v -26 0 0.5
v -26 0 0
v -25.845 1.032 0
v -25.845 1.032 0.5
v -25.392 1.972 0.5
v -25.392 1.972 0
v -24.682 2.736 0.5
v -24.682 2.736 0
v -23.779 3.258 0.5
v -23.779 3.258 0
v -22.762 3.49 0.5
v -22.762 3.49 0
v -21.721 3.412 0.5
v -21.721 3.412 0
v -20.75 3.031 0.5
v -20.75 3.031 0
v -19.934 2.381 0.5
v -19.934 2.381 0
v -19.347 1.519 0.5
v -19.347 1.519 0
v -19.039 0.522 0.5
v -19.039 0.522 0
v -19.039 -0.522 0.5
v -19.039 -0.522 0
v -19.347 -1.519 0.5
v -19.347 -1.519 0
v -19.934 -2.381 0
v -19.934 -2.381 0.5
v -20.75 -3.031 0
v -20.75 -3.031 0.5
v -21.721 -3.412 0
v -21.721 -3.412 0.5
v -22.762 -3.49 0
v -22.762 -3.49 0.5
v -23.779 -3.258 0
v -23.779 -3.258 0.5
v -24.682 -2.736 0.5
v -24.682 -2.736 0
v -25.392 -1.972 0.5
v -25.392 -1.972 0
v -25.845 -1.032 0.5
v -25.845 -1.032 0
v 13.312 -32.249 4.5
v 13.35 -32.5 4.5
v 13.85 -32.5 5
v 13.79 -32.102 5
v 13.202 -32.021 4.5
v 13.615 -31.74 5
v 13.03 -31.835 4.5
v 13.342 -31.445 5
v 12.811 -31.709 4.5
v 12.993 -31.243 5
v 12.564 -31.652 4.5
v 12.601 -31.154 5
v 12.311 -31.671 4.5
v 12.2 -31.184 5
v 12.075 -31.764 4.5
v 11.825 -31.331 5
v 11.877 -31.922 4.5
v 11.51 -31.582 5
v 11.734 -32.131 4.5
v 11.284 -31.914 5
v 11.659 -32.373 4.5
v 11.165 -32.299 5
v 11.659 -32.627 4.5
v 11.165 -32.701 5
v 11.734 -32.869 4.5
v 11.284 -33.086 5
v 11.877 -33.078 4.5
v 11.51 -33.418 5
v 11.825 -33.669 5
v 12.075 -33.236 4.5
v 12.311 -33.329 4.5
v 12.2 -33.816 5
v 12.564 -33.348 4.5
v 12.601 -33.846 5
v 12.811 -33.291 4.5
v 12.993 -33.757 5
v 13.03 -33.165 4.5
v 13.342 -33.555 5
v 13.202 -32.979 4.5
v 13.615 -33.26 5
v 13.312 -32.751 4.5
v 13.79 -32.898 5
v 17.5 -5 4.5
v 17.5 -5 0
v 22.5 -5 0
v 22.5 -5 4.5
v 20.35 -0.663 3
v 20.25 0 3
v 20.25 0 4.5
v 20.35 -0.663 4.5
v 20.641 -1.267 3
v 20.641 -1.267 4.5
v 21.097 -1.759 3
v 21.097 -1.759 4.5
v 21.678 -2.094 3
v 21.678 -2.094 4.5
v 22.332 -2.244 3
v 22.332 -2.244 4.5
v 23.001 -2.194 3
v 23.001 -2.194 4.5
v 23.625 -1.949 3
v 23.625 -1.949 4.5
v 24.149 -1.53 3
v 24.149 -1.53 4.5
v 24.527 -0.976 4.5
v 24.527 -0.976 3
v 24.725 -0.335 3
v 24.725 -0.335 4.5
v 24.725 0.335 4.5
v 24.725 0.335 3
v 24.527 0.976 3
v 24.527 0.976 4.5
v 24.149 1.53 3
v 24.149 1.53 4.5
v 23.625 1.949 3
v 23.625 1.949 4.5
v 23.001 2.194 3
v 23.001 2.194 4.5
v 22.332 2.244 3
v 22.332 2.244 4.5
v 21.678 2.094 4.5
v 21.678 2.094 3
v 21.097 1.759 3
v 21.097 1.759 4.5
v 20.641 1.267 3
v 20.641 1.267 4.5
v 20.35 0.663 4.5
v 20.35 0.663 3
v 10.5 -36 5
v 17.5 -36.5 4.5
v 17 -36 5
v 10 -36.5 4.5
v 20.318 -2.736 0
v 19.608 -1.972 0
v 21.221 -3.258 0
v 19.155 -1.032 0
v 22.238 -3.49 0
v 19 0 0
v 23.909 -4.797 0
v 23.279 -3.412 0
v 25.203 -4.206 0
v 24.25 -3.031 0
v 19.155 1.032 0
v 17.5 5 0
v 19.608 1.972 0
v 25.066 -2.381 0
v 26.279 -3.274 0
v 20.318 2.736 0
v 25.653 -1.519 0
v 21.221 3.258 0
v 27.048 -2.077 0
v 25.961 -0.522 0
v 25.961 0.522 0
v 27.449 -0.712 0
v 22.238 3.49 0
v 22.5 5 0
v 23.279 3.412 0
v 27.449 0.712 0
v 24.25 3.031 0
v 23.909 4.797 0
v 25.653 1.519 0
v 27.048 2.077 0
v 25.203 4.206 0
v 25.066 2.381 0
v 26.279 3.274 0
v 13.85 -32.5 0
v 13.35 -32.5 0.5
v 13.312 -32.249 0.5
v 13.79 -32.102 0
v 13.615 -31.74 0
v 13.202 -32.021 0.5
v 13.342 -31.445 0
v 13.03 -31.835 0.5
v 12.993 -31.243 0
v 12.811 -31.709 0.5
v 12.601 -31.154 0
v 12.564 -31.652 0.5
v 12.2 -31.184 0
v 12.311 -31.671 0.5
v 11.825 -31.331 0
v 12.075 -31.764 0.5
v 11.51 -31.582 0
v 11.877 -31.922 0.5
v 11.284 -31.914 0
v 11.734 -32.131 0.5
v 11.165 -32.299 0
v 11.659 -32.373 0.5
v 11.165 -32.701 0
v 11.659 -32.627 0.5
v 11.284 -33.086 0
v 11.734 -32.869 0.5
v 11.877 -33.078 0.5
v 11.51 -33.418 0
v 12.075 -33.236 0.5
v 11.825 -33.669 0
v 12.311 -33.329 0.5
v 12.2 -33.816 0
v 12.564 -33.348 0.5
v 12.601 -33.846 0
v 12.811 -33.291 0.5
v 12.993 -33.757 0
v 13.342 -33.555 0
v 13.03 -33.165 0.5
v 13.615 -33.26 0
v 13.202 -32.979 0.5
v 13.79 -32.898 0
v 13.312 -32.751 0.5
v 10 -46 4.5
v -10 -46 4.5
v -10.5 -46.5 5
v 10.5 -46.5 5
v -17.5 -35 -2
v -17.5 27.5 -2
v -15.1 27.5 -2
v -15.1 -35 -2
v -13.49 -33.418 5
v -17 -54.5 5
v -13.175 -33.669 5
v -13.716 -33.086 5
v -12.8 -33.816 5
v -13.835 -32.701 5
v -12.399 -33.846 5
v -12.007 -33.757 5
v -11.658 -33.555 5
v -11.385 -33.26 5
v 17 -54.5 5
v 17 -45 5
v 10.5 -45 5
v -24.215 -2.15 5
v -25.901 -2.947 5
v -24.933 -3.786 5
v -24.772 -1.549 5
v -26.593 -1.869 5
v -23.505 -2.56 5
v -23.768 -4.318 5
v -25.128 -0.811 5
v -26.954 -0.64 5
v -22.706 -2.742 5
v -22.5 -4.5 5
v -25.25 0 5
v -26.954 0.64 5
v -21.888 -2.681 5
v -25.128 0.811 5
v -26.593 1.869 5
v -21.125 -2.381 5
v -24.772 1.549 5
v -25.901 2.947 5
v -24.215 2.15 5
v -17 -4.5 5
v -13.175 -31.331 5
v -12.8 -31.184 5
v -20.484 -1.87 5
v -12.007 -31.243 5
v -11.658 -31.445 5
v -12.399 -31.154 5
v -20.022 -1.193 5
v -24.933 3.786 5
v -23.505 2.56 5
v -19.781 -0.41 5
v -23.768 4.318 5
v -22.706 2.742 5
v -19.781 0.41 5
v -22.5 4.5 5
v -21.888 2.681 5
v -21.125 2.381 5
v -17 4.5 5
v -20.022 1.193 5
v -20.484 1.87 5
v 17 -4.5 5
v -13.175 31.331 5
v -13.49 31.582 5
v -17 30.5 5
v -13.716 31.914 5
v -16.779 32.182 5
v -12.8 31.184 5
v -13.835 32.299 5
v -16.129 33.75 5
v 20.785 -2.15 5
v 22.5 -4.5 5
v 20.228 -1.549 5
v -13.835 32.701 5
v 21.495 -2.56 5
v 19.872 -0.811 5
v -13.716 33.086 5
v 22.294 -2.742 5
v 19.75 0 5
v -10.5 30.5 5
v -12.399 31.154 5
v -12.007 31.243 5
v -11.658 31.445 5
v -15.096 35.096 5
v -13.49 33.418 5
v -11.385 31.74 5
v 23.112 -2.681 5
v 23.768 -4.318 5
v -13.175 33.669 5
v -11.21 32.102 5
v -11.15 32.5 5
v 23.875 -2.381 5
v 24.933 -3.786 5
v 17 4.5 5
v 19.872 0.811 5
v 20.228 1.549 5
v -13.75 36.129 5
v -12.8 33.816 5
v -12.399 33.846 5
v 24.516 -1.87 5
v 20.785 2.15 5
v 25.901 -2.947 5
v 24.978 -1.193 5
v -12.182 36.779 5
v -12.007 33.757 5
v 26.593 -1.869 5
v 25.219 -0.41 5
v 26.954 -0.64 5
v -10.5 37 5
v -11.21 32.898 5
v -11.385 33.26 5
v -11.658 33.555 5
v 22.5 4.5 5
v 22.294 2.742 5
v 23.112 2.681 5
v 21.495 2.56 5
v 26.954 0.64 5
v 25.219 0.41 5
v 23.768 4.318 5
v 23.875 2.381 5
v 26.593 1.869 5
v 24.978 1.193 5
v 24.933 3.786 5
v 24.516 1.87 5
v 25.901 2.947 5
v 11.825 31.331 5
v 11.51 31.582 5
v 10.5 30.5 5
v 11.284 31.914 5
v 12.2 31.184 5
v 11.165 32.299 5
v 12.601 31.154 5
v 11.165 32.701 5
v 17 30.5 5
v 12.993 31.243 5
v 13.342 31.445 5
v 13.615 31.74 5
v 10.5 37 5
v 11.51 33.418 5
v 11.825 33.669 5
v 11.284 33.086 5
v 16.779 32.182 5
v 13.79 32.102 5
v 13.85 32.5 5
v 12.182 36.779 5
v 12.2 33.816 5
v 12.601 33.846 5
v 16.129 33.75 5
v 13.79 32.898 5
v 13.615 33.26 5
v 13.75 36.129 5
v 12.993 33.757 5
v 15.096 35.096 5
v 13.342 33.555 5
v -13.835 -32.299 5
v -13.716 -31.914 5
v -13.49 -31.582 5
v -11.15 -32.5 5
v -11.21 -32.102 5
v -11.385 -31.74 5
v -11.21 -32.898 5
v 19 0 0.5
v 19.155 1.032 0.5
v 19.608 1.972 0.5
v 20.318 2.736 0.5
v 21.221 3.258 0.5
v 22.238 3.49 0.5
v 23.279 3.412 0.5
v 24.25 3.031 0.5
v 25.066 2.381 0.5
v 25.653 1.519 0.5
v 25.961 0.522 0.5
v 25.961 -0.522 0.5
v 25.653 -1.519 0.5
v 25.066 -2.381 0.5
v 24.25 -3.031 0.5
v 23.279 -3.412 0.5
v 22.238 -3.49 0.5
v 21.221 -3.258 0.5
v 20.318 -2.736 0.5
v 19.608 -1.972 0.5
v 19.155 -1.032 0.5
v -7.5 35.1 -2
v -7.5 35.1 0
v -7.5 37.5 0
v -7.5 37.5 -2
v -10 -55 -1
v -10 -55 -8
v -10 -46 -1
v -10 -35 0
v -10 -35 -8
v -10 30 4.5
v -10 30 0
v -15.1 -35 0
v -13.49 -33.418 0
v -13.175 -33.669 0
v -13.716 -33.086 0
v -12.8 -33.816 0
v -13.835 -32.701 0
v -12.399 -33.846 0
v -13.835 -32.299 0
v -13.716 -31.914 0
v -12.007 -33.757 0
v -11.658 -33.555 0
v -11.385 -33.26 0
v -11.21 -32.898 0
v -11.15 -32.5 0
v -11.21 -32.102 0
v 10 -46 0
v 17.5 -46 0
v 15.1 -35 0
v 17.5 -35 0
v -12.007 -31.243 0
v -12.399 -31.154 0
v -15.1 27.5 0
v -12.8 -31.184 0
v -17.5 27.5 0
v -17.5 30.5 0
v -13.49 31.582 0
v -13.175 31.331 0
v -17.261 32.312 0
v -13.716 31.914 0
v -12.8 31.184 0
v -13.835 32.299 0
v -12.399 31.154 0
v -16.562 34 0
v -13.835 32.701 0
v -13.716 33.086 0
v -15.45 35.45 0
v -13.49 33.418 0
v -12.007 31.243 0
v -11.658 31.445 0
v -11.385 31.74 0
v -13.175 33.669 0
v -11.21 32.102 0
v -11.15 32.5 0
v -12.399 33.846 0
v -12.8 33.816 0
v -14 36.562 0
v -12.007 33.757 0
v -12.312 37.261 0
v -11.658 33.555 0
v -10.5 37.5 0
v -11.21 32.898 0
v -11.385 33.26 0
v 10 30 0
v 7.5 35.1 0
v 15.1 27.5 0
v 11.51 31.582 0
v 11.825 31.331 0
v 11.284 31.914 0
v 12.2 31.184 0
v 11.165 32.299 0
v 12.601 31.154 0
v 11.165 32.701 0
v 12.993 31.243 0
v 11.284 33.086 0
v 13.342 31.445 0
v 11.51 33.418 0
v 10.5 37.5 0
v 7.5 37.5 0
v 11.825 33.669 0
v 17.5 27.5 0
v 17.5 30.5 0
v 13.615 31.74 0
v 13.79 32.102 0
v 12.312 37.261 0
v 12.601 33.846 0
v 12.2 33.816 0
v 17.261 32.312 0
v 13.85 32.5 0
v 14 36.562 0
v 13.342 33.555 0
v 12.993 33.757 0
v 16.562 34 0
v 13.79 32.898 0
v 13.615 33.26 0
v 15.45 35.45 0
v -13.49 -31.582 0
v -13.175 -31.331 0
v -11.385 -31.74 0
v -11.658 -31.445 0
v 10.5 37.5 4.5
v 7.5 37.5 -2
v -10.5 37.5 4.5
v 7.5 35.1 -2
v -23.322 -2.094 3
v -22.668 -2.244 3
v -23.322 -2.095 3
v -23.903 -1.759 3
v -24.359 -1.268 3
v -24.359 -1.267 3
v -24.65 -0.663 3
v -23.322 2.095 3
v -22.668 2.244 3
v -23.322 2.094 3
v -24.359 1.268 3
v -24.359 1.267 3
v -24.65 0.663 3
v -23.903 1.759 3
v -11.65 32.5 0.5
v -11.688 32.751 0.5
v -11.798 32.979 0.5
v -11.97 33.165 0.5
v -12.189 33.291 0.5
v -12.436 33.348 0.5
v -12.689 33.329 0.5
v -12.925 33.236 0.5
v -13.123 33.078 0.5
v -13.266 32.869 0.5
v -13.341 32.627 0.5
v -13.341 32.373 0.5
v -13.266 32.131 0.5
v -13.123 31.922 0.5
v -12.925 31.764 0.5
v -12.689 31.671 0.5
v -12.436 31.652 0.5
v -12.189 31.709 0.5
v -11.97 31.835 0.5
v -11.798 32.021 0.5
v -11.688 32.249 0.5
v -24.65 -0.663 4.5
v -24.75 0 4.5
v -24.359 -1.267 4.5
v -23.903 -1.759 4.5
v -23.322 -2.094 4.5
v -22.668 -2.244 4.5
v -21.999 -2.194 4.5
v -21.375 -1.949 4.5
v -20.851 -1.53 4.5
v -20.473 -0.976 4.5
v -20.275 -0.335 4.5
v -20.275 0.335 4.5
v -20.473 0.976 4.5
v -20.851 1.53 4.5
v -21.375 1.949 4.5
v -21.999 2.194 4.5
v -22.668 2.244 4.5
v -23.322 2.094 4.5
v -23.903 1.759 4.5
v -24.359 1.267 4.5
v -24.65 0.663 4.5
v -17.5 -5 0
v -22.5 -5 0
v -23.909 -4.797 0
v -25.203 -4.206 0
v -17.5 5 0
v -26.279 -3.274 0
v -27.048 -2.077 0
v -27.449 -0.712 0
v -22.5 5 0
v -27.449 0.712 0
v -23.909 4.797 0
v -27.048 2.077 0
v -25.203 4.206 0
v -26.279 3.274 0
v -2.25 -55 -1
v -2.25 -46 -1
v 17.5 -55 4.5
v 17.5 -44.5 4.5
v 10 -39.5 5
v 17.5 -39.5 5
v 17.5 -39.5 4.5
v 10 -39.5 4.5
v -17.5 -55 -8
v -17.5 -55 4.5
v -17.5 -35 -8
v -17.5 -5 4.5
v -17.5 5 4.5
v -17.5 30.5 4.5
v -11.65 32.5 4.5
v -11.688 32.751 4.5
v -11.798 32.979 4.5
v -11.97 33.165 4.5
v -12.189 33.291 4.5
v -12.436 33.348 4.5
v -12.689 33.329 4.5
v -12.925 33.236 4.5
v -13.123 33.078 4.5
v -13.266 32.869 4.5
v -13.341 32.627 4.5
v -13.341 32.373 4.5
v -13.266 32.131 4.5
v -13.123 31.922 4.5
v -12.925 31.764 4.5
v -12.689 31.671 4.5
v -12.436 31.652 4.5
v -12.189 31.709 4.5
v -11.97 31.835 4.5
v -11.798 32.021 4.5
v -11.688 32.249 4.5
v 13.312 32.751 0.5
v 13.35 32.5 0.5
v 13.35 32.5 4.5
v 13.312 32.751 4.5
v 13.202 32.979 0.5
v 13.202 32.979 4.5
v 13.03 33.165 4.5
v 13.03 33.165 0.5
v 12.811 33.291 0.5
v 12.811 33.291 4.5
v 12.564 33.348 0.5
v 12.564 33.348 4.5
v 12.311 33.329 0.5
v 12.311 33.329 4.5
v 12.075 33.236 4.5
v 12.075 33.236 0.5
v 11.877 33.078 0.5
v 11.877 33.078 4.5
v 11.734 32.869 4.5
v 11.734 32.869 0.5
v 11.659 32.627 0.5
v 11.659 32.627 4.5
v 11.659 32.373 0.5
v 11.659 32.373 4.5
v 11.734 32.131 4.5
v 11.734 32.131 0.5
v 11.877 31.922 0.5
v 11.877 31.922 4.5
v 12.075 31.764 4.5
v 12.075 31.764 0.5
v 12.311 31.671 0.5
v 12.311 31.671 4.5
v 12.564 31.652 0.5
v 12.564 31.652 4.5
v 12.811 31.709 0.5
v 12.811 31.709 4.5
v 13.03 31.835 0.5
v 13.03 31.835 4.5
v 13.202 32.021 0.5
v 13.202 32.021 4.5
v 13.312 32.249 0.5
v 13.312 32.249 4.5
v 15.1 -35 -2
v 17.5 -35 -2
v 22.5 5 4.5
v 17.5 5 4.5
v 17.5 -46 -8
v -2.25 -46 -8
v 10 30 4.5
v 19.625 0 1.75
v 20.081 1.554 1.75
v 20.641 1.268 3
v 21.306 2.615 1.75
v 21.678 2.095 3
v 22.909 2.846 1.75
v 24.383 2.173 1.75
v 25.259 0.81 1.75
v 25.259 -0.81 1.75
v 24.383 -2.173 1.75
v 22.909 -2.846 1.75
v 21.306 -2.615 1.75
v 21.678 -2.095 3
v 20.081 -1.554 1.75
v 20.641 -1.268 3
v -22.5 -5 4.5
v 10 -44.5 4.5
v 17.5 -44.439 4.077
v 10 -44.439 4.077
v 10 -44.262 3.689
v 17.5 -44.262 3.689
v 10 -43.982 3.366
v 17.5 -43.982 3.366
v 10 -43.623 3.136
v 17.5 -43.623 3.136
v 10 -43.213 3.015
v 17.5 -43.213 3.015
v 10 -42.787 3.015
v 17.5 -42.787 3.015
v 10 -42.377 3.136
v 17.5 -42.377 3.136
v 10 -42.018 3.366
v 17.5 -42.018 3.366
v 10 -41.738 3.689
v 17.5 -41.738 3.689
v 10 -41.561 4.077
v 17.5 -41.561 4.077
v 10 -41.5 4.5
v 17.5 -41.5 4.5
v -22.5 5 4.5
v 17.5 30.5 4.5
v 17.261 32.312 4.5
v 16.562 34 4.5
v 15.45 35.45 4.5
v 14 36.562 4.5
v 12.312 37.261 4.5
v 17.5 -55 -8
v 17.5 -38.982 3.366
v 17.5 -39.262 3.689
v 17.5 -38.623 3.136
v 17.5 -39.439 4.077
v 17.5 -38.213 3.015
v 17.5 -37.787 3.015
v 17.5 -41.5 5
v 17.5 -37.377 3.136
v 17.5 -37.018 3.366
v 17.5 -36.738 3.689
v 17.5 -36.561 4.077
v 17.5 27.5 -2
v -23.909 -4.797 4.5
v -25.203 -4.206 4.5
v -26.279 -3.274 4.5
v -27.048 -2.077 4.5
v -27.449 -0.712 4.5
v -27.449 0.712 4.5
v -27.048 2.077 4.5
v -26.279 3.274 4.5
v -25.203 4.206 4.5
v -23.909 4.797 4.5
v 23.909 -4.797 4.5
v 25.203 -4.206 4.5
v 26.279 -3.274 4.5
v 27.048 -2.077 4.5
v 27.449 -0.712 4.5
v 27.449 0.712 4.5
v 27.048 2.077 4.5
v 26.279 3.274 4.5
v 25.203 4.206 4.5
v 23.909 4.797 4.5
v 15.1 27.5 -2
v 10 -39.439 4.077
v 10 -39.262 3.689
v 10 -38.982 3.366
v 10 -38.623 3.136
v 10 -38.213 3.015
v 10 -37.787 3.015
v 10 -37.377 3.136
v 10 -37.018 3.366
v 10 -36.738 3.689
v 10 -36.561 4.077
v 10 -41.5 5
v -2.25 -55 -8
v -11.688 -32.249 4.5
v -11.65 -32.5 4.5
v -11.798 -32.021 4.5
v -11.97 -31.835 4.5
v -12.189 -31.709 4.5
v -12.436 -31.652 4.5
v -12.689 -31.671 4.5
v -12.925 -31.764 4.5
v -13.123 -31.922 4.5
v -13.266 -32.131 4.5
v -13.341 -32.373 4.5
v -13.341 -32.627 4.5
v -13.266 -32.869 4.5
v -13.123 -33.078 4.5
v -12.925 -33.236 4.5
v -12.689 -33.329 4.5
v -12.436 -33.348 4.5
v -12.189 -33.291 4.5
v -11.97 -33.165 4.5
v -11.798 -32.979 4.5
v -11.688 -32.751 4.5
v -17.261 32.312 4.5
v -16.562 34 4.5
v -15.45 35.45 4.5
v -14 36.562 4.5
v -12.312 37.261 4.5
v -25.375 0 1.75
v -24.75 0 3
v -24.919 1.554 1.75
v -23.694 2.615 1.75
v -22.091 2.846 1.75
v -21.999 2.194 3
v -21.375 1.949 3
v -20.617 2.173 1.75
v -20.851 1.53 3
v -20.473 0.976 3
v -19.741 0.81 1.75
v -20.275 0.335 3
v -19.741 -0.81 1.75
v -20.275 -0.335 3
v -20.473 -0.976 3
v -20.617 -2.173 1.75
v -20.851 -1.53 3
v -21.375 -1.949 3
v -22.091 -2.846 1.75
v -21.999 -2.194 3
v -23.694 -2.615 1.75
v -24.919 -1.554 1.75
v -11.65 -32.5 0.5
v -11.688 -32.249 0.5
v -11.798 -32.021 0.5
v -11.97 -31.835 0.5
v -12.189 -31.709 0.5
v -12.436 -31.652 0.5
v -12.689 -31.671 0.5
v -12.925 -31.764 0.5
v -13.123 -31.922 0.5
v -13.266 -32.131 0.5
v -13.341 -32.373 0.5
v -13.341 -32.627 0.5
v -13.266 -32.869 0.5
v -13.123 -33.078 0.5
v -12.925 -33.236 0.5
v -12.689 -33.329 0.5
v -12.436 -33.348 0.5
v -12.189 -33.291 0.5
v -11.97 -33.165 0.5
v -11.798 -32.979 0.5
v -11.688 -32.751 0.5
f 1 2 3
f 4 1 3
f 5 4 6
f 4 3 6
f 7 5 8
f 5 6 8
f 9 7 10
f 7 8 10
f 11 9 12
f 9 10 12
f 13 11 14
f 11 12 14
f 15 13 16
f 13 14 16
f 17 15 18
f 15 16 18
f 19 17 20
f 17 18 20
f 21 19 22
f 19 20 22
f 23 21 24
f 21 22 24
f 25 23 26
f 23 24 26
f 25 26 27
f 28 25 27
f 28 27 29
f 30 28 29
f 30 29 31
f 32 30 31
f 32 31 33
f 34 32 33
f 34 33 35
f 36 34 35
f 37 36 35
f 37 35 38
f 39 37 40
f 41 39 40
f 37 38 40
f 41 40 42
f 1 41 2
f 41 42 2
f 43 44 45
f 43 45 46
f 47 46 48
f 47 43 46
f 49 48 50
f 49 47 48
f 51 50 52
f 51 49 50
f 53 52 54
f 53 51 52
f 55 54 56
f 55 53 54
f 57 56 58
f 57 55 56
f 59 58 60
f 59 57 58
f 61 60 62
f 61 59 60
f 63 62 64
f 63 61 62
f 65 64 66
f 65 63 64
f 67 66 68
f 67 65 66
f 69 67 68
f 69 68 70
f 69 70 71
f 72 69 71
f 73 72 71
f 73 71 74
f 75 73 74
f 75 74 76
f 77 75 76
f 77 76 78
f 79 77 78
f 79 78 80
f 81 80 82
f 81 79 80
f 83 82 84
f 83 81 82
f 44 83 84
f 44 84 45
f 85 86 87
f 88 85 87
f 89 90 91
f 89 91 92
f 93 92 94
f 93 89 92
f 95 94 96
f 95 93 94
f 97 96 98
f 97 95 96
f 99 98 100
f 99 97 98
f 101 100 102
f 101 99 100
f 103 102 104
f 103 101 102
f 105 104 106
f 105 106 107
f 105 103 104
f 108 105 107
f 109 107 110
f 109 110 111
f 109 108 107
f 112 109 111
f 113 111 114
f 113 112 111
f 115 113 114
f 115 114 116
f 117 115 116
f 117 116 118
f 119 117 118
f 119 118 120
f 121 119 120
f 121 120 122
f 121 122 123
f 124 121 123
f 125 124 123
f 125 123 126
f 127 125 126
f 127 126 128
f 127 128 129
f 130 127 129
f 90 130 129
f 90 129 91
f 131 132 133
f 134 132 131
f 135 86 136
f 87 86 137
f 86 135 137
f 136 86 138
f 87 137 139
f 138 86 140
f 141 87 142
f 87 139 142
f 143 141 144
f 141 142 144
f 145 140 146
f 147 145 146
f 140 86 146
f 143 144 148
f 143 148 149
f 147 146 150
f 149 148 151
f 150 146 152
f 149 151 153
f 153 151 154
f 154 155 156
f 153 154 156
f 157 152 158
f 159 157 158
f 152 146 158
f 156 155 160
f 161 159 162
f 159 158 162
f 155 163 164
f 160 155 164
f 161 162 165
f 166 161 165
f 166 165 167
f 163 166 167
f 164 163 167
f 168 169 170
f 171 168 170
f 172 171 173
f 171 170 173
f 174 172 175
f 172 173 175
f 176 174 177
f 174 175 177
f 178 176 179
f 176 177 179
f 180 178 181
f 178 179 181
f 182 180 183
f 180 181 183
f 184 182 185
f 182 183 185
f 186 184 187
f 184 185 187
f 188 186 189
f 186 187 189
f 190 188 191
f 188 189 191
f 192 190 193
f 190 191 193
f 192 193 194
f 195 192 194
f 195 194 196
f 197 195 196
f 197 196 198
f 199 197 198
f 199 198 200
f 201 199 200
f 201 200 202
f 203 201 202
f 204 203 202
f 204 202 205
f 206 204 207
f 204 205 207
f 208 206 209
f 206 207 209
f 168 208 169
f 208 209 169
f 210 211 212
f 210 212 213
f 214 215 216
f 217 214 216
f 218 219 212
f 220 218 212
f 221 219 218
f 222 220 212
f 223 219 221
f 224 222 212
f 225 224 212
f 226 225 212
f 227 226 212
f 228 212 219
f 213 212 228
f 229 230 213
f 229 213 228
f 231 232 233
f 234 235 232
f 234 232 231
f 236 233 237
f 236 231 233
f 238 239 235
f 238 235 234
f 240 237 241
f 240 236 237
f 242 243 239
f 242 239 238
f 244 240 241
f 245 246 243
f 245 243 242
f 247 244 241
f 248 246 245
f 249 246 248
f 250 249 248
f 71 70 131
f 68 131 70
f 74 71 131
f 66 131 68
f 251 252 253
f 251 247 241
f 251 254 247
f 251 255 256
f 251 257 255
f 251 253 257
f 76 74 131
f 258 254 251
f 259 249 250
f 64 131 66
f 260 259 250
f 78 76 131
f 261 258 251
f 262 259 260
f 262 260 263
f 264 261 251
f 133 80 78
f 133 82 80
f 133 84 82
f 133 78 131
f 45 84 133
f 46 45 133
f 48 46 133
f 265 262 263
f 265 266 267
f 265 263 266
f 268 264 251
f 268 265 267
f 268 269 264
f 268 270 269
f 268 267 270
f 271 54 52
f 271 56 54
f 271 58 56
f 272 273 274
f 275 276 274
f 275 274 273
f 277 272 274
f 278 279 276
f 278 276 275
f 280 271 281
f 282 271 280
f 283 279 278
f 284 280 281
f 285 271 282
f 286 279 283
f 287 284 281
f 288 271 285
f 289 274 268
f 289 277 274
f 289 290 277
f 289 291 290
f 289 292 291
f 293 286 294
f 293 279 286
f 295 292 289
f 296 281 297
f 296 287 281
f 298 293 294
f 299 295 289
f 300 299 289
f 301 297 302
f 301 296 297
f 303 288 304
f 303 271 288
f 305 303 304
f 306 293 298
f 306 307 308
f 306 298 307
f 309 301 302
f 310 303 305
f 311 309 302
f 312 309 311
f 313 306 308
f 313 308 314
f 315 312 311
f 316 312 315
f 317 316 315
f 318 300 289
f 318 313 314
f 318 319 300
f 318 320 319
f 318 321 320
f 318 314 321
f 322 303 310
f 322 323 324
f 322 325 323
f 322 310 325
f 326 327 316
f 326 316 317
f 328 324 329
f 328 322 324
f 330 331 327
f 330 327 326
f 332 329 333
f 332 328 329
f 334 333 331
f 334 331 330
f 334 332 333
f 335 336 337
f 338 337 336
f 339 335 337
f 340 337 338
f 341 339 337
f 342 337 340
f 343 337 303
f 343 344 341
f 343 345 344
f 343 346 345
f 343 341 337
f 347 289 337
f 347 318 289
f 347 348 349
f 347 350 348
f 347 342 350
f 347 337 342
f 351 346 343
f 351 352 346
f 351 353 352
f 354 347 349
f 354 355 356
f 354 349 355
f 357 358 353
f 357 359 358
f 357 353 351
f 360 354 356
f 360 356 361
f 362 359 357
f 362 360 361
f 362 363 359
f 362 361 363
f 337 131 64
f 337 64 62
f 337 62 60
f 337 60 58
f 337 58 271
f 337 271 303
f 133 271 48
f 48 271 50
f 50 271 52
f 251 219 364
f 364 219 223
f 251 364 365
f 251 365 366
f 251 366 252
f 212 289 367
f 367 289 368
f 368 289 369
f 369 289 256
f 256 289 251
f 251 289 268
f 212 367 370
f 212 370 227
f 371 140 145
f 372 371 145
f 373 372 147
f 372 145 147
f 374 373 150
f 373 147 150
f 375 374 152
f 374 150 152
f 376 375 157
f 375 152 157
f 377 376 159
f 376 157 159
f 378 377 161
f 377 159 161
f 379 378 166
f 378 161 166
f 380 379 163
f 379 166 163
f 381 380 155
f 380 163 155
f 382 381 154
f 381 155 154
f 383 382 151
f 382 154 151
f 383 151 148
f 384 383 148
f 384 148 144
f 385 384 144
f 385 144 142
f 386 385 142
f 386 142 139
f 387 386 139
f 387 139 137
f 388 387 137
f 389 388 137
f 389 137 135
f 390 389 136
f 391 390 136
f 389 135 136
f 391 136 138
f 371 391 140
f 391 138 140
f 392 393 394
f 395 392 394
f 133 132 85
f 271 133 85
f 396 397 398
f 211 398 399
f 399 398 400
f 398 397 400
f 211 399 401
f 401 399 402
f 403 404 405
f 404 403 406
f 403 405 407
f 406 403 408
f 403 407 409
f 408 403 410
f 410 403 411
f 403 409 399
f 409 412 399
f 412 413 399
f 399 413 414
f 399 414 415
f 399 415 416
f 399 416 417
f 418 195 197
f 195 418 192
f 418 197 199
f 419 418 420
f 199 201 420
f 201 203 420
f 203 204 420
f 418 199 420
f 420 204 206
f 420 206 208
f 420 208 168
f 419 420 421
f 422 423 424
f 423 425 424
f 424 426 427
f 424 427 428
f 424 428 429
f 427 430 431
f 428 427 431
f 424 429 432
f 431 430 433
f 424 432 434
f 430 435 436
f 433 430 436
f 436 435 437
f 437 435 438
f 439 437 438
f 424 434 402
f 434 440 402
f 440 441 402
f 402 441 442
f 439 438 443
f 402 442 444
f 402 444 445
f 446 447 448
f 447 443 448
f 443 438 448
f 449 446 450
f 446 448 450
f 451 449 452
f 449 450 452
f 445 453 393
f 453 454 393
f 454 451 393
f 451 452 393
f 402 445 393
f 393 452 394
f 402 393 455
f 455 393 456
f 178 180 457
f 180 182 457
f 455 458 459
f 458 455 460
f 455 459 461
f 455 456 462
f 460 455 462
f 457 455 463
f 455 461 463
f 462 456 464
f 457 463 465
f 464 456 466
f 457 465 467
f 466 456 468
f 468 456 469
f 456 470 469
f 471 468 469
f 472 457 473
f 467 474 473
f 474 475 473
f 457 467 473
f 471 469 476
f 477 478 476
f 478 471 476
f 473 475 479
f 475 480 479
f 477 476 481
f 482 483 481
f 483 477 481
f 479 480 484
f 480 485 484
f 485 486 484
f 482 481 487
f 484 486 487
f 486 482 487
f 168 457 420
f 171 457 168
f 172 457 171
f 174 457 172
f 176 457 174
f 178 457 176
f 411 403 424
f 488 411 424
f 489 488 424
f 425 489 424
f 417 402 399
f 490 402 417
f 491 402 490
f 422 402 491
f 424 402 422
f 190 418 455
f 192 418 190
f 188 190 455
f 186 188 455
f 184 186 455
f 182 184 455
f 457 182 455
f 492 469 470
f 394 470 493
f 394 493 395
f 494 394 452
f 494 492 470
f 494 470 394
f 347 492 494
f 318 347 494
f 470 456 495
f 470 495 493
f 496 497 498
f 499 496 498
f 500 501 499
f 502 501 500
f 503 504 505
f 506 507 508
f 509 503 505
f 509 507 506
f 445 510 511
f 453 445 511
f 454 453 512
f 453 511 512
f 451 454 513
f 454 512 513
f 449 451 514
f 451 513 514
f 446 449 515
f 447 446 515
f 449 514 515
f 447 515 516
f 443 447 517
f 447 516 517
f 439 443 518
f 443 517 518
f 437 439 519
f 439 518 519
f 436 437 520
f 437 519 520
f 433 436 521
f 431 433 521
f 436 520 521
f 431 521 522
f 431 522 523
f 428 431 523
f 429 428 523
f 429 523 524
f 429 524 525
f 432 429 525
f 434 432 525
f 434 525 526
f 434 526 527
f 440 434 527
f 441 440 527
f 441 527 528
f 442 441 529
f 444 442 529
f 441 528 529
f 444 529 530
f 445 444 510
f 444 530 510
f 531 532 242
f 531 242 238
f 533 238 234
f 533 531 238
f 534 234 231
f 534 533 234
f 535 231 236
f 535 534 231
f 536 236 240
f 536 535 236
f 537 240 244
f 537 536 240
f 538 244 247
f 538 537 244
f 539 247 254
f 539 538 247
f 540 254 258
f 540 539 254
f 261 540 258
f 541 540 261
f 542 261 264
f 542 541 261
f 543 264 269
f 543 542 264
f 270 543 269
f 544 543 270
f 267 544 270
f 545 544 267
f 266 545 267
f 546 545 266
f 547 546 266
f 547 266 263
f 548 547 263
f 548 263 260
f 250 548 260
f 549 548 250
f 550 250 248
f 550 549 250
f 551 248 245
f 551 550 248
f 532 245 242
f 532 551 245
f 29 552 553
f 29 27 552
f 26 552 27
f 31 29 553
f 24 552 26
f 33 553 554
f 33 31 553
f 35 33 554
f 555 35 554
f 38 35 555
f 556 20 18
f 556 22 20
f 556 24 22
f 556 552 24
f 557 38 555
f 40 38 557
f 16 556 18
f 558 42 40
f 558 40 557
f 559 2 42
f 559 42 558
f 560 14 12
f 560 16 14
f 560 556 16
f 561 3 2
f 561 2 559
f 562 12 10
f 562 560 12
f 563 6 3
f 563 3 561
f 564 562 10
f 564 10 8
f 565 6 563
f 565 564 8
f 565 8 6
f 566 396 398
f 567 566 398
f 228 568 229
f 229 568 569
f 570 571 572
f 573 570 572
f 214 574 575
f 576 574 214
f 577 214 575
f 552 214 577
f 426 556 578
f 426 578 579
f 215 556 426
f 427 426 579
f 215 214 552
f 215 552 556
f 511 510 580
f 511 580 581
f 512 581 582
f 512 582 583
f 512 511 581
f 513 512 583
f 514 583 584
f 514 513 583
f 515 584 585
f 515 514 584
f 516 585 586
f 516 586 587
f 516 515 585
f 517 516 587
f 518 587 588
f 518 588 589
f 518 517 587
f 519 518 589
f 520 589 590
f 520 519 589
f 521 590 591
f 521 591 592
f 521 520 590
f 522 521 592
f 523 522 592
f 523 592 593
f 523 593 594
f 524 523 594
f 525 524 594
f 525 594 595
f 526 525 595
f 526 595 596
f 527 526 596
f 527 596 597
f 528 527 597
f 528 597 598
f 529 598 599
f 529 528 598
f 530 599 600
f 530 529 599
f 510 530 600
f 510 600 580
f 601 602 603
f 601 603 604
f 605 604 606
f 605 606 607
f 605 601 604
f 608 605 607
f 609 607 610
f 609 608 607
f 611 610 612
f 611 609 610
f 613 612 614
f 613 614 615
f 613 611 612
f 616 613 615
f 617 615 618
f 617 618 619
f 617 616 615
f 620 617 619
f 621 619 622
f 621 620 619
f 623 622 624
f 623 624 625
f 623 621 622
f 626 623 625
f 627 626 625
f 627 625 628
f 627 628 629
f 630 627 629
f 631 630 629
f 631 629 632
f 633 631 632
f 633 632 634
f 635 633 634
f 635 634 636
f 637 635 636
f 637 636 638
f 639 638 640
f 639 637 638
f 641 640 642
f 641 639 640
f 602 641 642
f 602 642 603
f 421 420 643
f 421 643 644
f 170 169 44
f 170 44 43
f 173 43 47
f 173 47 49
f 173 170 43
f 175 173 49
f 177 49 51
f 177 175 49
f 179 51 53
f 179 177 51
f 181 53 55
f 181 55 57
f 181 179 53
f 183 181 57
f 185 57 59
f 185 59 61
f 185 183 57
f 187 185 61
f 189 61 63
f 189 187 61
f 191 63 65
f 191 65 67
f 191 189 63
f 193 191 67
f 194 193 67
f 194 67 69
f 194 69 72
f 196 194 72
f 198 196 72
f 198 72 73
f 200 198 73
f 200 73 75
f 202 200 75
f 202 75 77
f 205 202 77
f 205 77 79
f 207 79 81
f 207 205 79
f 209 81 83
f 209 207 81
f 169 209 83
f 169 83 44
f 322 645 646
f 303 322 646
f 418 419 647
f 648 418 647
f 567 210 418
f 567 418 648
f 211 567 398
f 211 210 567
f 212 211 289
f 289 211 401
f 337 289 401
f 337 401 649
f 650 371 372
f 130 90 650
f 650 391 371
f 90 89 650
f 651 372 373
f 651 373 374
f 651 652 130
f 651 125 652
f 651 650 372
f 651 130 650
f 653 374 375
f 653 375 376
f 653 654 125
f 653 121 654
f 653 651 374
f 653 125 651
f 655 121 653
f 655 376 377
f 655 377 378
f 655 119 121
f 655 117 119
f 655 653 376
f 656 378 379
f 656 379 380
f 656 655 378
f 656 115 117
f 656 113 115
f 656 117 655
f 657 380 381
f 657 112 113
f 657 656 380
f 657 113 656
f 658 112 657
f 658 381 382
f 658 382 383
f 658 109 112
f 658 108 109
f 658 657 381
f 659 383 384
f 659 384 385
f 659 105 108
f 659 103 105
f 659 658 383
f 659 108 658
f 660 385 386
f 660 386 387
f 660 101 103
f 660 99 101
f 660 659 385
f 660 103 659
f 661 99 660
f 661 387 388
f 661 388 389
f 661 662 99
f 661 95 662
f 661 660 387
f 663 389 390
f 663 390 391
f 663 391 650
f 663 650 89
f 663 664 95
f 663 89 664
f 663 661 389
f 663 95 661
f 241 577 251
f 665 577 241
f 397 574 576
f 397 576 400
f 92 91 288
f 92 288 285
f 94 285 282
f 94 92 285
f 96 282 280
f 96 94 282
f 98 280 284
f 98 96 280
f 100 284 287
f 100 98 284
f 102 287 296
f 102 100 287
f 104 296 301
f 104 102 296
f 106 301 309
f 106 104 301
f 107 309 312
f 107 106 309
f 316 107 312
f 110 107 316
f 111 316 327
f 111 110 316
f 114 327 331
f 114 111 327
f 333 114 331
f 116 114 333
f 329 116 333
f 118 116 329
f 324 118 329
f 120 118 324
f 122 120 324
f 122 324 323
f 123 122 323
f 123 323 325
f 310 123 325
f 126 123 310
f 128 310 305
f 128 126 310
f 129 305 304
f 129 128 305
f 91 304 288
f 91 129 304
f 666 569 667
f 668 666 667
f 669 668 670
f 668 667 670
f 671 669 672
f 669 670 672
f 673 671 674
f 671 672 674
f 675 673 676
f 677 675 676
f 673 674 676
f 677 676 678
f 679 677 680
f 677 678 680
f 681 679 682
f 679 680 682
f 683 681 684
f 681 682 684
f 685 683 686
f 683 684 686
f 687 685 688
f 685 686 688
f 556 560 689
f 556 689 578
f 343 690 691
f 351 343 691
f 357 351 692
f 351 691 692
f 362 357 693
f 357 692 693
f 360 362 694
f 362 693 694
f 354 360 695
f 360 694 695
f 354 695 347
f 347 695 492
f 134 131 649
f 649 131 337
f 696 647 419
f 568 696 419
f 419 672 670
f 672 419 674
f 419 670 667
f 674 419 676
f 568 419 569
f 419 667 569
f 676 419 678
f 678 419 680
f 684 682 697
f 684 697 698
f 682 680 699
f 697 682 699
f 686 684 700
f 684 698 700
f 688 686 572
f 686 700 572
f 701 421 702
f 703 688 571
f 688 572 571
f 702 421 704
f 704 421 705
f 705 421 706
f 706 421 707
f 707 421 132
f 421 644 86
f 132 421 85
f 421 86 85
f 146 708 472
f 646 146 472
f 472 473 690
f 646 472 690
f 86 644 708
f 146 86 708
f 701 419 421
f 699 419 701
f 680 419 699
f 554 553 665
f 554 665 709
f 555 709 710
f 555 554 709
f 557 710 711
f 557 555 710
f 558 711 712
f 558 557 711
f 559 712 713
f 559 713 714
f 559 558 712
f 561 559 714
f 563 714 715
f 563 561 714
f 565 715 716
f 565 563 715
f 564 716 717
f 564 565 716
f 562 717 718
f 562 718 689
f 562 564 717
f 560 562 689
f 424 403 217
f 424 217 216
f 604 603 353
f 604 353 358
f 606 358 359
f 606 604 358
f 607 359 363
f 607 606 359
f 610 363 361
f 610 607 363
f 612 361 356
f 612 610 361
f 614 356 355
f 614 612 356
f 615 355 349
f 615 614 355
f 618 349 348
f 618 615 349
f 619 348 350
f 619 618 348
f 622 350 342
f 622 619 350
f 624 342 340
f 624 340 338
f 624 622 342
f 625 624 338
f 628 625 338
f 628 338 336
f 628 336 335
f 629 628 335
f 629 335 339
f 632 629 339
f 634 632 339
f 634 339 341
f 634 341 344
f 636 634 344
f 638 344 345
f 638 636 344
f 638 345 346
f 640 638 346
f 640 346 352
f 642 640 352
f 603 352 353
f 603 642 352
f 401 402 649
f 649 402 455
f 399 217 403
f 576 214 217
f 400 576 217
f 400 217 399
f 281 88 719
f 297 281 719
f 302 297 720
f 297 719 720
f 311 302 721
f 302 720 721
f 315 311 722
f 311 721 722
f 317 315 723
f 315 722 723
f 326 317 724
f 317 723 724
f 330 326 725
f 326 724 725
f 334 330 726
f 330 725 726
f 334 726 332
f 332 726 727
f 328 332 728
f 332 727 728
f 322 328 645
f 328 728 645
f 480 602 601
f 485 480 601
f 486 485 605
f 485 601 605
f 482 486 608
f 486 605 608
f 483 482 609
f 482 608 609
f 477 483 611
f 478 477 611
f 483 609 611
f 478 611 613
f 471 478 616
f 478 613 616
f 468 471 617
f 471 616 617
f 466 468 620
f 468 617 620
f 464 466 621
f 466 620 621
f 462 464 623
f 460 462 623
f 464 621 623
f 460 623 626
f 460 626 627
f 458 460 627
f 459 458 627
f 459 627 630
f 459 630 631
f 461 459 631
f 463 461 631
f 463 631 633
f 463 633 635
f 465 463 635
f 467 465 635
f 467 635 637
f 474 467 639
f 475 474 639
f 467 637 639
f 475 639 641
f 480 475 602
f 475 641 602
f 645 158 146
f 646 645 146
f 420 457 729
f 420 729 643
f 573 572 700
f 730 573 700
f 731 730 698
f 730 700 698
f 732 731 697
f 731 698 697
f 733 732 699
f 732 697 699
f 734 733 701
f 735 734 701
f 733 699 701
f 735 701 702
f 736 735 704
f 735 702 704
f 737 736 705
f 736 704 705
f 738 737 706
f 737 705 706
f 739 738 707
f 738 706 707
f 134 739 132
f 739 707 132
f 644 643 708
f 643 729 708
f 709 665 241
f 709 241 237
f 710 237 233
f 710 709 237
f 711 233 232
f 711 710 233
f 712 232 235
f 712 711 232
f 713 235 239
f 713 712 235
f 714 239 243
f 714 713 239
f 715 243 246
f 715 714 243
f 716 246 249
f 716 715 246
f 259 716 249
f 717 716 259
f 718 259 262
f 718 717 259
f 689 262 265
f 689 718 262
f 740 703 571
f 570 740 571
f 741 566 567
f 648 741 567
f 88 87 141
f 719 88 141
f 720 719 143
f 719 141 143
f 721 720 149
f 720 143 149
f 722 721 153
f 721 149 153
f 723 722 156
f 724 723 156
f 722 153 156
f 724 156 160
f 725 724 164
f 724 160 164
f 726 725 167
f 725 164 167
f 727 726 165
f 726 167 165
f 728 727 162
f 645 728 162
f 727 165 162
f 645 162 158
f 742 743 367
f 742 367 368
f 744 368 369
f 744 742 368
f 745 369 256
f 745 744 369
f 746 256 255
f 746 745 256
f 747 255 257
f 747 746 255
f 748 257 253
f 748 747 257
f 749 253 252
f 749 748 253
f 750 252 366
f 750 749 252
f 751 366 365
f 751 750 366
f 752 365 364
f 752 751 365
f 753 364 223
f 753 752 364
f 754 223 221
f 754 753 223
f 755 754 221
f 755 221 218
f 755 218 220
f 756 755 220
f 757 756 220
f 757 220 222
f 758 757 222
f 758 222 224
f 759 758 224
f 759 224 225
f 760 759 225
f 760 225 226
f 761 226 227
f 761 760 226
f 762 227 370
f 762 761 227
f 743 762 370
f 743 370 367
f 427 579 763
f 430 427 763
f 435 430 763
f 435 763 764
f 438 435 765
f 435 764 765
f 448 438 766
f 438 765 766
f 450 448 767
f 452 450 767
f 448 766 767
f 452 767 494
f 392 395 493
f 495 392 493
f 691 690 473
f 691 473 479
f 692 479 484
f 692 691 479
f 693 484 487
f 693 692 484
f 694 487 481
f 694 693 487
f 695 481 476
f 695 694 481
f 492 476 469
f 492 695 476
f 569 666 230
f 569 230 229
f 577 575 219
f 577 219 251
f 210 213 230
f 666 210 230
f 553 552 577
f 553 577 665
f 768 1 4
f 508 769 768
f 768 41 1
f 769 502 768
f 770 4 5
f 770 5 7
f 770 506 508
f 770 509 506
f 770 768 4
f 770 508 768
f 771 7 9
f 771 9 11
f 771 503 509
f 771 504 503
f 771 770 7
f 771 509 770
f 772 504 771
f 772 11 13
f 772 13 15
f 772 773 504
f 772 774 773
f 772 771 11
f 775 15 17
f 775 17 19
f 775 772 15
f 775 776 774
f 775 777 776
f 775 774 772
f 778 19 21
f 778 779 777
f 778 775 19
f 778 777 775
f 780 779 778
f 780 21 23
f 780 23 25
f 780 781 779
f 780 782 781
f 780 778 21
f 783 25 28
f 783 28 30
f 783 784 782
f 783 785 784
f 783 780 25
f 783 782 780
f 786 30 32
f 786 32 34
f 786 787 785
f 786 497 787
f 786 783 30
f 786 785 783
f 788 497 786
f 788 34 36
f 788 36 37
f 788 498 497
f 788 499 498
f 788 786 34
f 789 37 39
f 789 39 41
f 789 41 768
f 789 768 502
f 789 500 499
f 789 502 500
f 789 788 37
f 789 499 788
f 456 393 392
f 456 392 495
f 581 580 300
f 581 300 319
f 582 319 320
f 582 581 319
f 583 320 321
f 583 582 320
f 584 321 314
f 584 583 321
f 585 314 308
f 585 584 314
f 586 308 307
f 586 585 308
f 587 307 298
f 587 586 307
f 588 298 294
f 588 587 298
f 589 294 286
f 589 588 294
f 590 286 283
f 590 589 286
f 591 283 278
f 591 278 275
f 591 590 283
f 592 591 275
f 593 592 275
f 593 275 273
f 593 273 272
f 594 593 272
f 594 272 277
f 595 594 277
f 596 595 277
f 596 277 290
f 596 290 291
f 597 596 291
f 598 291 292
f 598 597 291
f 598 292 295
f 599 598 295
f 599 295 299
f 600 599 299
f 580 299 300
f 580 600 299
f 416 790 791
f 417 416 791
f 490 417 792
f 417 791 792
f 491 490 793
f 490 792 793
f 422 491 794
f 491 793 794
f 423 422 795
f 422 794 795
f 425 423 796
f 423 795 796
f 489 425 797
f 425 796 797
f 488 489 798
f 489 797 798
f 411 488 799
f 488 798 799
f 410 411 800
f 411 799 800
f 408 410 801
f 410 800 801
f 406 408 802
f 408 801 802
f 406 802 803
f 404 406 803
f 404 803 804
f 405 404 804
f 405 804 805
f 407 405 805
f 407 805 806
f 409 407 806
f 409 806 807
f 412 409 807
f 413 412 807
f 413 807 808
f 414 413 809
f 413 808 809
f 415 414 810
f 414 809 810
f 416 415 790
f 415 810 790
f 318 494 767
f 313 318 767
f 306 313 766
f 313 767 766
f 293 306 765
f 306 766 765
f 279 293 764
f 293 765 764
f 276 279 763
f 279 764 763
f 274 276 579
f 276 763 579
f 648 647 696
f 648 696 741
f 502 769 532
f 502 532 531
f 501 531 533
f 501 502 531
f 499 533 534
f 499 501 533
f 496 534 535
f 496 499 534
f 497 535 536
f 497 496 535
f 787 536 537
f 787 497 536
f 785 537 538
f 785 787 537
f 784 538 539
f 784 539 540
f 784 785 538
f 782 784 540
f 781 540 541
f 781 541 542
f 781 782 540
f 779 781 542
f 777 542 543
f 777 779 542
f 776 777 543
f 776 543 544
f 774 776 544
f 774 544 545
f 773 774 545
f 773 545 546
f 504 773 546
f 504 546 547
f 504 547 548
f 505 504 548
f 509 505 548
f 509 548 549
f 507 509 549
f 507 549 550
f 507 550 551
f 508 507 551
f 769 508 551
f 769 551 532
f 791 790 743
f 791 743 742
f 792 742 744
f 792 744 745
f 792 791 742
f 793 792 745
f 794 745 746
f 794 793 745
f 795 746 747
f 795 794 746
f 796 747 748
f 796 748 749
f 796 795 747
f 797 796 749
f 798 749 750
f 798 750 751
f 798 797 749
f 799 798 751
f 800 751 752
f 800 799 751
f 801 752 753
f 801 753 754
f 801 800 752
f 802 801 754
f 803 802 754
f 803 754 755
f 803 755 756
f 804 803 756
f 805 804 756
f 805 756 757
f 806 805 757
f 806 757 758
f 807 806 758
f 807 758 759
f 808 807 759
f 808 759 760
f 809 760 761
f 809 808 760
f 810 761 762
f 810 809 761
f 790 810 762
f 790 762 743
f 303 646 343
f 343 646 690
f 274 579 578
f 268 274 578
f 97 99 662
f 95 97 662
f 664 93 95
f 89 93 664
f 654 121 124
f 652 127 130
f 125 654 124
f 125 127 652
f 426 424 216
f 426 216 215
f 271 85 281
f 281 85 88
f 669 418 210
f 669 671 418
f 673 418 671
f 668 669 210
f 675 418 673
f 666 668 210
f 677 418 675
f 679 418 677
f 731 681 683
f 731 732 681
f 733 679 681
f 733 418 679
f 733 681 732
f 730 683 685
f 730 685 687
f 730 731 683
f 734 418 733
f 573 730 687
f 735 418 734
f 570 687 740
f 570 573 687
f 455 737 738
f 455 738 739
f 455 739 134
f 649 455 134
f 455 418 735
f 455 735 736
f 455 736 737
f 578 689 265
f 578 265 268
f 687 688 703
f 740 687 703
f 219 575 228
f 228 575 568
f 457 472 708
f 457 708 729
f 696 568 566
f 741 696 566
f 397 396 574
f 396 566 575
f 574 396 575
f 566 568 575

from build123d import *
from OCP.BRepFilletAPI import BRepFilletAPI_MakeChamfer

# Parameters (mm, degrees)
SKETCH1_R                = 0.85
BOSS_EXTRUDE1_DEPTH      = 5
BOSS_EXTRUDE2_DEPTH      = 2
SKETCH3_R                = 2.25
BOSS_EXTRUDE3_DEPTH      = 5
SKETCH4_R                = 3.5
CUT_EXTRUDE1_DEPTH       = 3
SKETCH5_W                = 10
SKETCH5_H                = 10
CUT_EXTRUDE2_DEPTH       = 47.770717335
FILLET1_R                = 7
BOSS_EXTRUDE4_DEPTH      = 5
BOSS_EXTRUDE4_DEPTH_BACK = 8
SKETCH6_W                = 7.5
SKETCH6_H                = 20
SKETCH7_W                = 6
SKETCH7_H                = 9
BOSS_EXTRUDE5_DEPTH      = 27.5
SKETCH8_W                = 19.75
SKETCH8_H                = 9
BOSS_EXTRUDE6_DEPTH      = 7
SKETCH9_W                = 7.5
SKETCH9_H                = 5
BOSS_EXTRUDE7_DEPTH      = 11
CUT_EXTRUDE3_DEPTH       = 7.5
CHAMFER3_SIZE            = 0.5
CHAMFER1_SIZE            = 2.5
CHAMFER1_SIZE_2          = 1.25


with BuildPart() as part:
    # Sketch1 → Boss-Extrude1 (new body)
    with BuildSketch(Plane.XY):
        Polygon((-10, -35), (-10, 30), (10, 30), (10, -35), (17.5, -35), (17.5, 37.5), (-17.5, 37.5), (-17.5, -35), align=None)
        with Locations((-12.5, 32.5)):
            Circle(SKETCH1_R, mode=Mode.SUBTRACT)
        with Locations((12.5, 32.5)):
            Circle(SKETCH1_R, mode=Mode.SUBTRACT)
        with Locations((-12.5, -32.5)):
            Circle(SKETCH1_R, mode=Mode.SUBTRACT)
        with Locations((12.5, -32.5)):
            Circle(SKETCH1_R, mode=Mode.SUBTRACT)
    extrude(amount=BOSS_EXTRUDE1_DEPTH)

    # Sketch2 → Boss-Extrude2 (add)
    with BuildSketch(Plane.XY):
        Polygon((17.5, -35), (17.5, 37.5), (-17.5, 37.5), (-17.5, -35), (-15.1, -35), (-15.1, 35.1), (15.1, 35.1), (15.1, -35), align=None)
    extrude(amount=-BOSS_EXTRUDE2_DEPTH)

    # Sketch3 → Boss-Extrude3 (add)
    # profile 1 of 2: a face of its own
    with BuildSketch(Plane.XY):
        with BuildLine():
            Line((22.5, 5), (17.5, 5))
            Line((17.5, 5), (17.5, -5))
            Line((17.5, -5), (22.5, -5))
            ThreePointArc((22.5, -5), (27.5, 0), (22.5, 5))
        make_face()
        with Locations(Location((22.5, 0, 0), (0, 0, 180))):
            Circle(SKETCH3_R, mode=Mode.SUBTRACT)
    # profile 2 of 2: a face of its own
    with BuildSketch(Plane.XY):
        with BuildLine():
            Line((-22.5, 5), (-17.5, 5))
            Line((-17.5, 5), (-17.5, -5))
            Line((-17.5, -5), (-22.5, -5))
            ThreePointArc((-22.5, -5), (-27.5, 0), (-22.5, 5))
        make_face()
        with Locations(Location((-22.5, 0, 0), (0, 0, 180))):
            Circle(SKETCH3_R, mode=Mode.SUBTRACT)
    extrude(amount=BOSS_EXTRUDE3_DEPTH)

    # Sketch4 → Cut-Extrude1 (cut)
    with BuildSketch(Plane(origin=(0, 0, 0), x_dir=(-1, 0, 0), z_dir=(0, 0, -1))):
        with Locations((-22.5, 0)):
            Circle(SKETCH4_R)
        with Locations((22.5, 0)):
            Circle(SKETCH4_R)
    extrude(amount=-CUT_EXTRUDE1_DEPTH, mode=Mode.SUBTRACT)

    # Sketch5 → Cut-Extrude2 (cut, through all)
    with BuildSketch(Plane(origin=(0, 0, 0), x_dir=(-1, 0, 0), z_dir=(0, 0, -1))):
        with Locations((-12.5, 32.5)):
            Rectangle(SKETCH5_W, SKETCH5_H)
        with Locations((12.5, 32.5)):
            Rectangle(SKETCH5_W, SKETCH5_H)
    extrude(amount=CUT_EXTRUDE2_DEPTH, mode=Mode.SUBTRACT)

    # Fillet1
    fillet1_edges = [part.edges().sort_by_distance(p)[0] for p in [
        (-17.5, 37.5, 2.5),
        (17.5, 37.5, 2.5),
    ]]
    fillet(fillet1_edges, radius=FILLET1_R)

    # Sketch6 → Boss-Extrude4 (add, two sides: drawn at the far end of the back side and taken through both)
    with BuildSketch(Plane.XY.offset(-BOSS_EXTRUDE4_DEPTH_BACK)):
        with Locations((-13.75, -45)):
            Rectangle(SKETCH6_W, SKETCH6_H)
    extrude(amount=BOSS_EXTRUDE4_DEPTH + BOSS_EXTRUDE4_DEPTH_BACK)

    # Sketch7 → Boss-Extrude5 (add)
    with BuildSketch(Plane(origin=(-10, 0, 0), x_dir=(0, 0, -1), z_dir=(1, 0, 0))):
        with Locations((-2, -50.5)):
            Rectangle(SKETCH7_W, SKETCH7_H)
    extrude(amount=BOSS_EXTRUDE5_DEPTH)

    # Sketch8 → Boss-Extrude6 (add)
    with BuildSketch(Plane(origin=(0, 0, -1), x_dir=(-1, 0, 0), z_dir=(0, 0, -1))):
        with Locations((-7.625, -50.5)):
            Rectangle(SKETCH8_W, SKETCH8_H)
    extrude(amount=BOSS_EXTRUDE6_DEPTH)

    # Sketch9 → Boss-Extrude7 (add)
    with BuildSketch(Plane.XZ.offset(35)):
        with Locations((13.75, 2.5)):
            Rectangle(SKETCH9_W, SKETCH9_H)
    extrude(amount=BOSS_EXTRUDE7_DEPTH)

    # Sketch10 → Cut-Extrude3 (cut)
    with BuildSketch(Plane(origin=(17.5, 0, 0), x_dir=(0, 0, -1), z_dir=(1, 0, 0))):
        with BuildLine():
            Line((-4.5, -36.5), (-6, -36.5))
            Line((-6, -36.5), (-6, -44.5))
            Line((-6, -44.5), (-4.5, -44.5))
            ThreePointArc((-4.5, -44.5), (-3, -43), (-4.5, -41.5))
            Line((-4.5, -41.5), (-5, -41.5))
            Line((-5, -41.5), (-5, -39.5))
            Line((-5, -39.5), (-4.5, -39.5))
            ThreePointArc((-4.5, -39.5), (-3, -38), (-4.5, -36.5))
        make_face()
    extrude(amount=-CUT_EXTRUDE3_DEPTH, mode=Mode.SUBTRACT)

    # Chamfer3
    chamfer3_edges = [part.edges().sort_by_distance(p)[0] for p in [
        (0, 30, 5),
        (-17.5, 17.75, 5),
        (0, 37.5, 5),
        (15.449747468, 35.449747468, 5),
        (-15.449747468, 35.449747468, 5),
        (10, -3.25, 5),
        (0, -55, 5),
        (-10, -8, 5),
        (0, -46, 5),
        (-13.35, 32.5, 0),
        (-13.35, 32.5, 5),
        (10, -45.25, 5),
        (17.5, -20.75, 5),
        (13.75, -44.5, 5),
        (13.75, -36.5, 5),
        (17.5, -49.75, 5),
        (11.65, 32.5, 0),
        (11.65, 32.5, 5),
        (-13.35, -32.5, 0),
        (-13.35, -32.5, 5),
        (11.65, -32.5, 0),
        (11.65, -32.5, 5),
        (17.5, 17.75, 5),
        (27.5, 0, 5),
        (20, 5, 5),
        (20, -5, 5),
        (24.75, 0, 5),
        (-17.5, -30, 5),
        (-27.5, 0, 5),
        (-20, -5, 5),
        (-20, 5, 5),
        (-20.25, 0, 5),
    ]]
    chamfer(chamfer3_edges, length=CHAMFER3_SIZE - 0.0001)  # a hair under: the kernel refuses the full size

    # Chamfer1
    chamfer1_edges_1 = [part.edges().sort_by_distance(p)[0] for p in [
        (26, 0, 3),
    ]]
    chamfer1_side_1 = [part.faces().sort_by_distance(p)[0] for p in [
        (26, 0, 2.975),
    ]]
    chamfer1_edges_2 = [part.edges().sort_by_distance(p)[0] for p in [
        (-19, 0, 3),
    ]]
    chamfer1_side_2 = [part.faces().sort_by_distance(p)[0] for p in [
        (-19, 0, 2.975),
    ]]
    chamfer1 = BRepFilletAPI_MakeChamfer(part.part.solid().wrapped)
    for e in chamfer1_edges_1:
        chamfer1.Add(CHAMFER1_SIZE - 0.0001, CHAMFER1_SIZE_2 - 0.0001, e.wrapped, chamfer1_side_1[0].wrapped)
    for e in chamfer1_edges_2:
        chamfer1.Add(CHAMFER1_SIZE - 0.0001, CHAMFER1_SIZE_2 - 0.0001, e.wrapped, chamfer1_side_2[0].wrapped)
    add(Compound.cast(chamfer1.Shape()), mode=Mode.REPLACE)  # a hair under: the kernel refuses the full size


solid = part.part
